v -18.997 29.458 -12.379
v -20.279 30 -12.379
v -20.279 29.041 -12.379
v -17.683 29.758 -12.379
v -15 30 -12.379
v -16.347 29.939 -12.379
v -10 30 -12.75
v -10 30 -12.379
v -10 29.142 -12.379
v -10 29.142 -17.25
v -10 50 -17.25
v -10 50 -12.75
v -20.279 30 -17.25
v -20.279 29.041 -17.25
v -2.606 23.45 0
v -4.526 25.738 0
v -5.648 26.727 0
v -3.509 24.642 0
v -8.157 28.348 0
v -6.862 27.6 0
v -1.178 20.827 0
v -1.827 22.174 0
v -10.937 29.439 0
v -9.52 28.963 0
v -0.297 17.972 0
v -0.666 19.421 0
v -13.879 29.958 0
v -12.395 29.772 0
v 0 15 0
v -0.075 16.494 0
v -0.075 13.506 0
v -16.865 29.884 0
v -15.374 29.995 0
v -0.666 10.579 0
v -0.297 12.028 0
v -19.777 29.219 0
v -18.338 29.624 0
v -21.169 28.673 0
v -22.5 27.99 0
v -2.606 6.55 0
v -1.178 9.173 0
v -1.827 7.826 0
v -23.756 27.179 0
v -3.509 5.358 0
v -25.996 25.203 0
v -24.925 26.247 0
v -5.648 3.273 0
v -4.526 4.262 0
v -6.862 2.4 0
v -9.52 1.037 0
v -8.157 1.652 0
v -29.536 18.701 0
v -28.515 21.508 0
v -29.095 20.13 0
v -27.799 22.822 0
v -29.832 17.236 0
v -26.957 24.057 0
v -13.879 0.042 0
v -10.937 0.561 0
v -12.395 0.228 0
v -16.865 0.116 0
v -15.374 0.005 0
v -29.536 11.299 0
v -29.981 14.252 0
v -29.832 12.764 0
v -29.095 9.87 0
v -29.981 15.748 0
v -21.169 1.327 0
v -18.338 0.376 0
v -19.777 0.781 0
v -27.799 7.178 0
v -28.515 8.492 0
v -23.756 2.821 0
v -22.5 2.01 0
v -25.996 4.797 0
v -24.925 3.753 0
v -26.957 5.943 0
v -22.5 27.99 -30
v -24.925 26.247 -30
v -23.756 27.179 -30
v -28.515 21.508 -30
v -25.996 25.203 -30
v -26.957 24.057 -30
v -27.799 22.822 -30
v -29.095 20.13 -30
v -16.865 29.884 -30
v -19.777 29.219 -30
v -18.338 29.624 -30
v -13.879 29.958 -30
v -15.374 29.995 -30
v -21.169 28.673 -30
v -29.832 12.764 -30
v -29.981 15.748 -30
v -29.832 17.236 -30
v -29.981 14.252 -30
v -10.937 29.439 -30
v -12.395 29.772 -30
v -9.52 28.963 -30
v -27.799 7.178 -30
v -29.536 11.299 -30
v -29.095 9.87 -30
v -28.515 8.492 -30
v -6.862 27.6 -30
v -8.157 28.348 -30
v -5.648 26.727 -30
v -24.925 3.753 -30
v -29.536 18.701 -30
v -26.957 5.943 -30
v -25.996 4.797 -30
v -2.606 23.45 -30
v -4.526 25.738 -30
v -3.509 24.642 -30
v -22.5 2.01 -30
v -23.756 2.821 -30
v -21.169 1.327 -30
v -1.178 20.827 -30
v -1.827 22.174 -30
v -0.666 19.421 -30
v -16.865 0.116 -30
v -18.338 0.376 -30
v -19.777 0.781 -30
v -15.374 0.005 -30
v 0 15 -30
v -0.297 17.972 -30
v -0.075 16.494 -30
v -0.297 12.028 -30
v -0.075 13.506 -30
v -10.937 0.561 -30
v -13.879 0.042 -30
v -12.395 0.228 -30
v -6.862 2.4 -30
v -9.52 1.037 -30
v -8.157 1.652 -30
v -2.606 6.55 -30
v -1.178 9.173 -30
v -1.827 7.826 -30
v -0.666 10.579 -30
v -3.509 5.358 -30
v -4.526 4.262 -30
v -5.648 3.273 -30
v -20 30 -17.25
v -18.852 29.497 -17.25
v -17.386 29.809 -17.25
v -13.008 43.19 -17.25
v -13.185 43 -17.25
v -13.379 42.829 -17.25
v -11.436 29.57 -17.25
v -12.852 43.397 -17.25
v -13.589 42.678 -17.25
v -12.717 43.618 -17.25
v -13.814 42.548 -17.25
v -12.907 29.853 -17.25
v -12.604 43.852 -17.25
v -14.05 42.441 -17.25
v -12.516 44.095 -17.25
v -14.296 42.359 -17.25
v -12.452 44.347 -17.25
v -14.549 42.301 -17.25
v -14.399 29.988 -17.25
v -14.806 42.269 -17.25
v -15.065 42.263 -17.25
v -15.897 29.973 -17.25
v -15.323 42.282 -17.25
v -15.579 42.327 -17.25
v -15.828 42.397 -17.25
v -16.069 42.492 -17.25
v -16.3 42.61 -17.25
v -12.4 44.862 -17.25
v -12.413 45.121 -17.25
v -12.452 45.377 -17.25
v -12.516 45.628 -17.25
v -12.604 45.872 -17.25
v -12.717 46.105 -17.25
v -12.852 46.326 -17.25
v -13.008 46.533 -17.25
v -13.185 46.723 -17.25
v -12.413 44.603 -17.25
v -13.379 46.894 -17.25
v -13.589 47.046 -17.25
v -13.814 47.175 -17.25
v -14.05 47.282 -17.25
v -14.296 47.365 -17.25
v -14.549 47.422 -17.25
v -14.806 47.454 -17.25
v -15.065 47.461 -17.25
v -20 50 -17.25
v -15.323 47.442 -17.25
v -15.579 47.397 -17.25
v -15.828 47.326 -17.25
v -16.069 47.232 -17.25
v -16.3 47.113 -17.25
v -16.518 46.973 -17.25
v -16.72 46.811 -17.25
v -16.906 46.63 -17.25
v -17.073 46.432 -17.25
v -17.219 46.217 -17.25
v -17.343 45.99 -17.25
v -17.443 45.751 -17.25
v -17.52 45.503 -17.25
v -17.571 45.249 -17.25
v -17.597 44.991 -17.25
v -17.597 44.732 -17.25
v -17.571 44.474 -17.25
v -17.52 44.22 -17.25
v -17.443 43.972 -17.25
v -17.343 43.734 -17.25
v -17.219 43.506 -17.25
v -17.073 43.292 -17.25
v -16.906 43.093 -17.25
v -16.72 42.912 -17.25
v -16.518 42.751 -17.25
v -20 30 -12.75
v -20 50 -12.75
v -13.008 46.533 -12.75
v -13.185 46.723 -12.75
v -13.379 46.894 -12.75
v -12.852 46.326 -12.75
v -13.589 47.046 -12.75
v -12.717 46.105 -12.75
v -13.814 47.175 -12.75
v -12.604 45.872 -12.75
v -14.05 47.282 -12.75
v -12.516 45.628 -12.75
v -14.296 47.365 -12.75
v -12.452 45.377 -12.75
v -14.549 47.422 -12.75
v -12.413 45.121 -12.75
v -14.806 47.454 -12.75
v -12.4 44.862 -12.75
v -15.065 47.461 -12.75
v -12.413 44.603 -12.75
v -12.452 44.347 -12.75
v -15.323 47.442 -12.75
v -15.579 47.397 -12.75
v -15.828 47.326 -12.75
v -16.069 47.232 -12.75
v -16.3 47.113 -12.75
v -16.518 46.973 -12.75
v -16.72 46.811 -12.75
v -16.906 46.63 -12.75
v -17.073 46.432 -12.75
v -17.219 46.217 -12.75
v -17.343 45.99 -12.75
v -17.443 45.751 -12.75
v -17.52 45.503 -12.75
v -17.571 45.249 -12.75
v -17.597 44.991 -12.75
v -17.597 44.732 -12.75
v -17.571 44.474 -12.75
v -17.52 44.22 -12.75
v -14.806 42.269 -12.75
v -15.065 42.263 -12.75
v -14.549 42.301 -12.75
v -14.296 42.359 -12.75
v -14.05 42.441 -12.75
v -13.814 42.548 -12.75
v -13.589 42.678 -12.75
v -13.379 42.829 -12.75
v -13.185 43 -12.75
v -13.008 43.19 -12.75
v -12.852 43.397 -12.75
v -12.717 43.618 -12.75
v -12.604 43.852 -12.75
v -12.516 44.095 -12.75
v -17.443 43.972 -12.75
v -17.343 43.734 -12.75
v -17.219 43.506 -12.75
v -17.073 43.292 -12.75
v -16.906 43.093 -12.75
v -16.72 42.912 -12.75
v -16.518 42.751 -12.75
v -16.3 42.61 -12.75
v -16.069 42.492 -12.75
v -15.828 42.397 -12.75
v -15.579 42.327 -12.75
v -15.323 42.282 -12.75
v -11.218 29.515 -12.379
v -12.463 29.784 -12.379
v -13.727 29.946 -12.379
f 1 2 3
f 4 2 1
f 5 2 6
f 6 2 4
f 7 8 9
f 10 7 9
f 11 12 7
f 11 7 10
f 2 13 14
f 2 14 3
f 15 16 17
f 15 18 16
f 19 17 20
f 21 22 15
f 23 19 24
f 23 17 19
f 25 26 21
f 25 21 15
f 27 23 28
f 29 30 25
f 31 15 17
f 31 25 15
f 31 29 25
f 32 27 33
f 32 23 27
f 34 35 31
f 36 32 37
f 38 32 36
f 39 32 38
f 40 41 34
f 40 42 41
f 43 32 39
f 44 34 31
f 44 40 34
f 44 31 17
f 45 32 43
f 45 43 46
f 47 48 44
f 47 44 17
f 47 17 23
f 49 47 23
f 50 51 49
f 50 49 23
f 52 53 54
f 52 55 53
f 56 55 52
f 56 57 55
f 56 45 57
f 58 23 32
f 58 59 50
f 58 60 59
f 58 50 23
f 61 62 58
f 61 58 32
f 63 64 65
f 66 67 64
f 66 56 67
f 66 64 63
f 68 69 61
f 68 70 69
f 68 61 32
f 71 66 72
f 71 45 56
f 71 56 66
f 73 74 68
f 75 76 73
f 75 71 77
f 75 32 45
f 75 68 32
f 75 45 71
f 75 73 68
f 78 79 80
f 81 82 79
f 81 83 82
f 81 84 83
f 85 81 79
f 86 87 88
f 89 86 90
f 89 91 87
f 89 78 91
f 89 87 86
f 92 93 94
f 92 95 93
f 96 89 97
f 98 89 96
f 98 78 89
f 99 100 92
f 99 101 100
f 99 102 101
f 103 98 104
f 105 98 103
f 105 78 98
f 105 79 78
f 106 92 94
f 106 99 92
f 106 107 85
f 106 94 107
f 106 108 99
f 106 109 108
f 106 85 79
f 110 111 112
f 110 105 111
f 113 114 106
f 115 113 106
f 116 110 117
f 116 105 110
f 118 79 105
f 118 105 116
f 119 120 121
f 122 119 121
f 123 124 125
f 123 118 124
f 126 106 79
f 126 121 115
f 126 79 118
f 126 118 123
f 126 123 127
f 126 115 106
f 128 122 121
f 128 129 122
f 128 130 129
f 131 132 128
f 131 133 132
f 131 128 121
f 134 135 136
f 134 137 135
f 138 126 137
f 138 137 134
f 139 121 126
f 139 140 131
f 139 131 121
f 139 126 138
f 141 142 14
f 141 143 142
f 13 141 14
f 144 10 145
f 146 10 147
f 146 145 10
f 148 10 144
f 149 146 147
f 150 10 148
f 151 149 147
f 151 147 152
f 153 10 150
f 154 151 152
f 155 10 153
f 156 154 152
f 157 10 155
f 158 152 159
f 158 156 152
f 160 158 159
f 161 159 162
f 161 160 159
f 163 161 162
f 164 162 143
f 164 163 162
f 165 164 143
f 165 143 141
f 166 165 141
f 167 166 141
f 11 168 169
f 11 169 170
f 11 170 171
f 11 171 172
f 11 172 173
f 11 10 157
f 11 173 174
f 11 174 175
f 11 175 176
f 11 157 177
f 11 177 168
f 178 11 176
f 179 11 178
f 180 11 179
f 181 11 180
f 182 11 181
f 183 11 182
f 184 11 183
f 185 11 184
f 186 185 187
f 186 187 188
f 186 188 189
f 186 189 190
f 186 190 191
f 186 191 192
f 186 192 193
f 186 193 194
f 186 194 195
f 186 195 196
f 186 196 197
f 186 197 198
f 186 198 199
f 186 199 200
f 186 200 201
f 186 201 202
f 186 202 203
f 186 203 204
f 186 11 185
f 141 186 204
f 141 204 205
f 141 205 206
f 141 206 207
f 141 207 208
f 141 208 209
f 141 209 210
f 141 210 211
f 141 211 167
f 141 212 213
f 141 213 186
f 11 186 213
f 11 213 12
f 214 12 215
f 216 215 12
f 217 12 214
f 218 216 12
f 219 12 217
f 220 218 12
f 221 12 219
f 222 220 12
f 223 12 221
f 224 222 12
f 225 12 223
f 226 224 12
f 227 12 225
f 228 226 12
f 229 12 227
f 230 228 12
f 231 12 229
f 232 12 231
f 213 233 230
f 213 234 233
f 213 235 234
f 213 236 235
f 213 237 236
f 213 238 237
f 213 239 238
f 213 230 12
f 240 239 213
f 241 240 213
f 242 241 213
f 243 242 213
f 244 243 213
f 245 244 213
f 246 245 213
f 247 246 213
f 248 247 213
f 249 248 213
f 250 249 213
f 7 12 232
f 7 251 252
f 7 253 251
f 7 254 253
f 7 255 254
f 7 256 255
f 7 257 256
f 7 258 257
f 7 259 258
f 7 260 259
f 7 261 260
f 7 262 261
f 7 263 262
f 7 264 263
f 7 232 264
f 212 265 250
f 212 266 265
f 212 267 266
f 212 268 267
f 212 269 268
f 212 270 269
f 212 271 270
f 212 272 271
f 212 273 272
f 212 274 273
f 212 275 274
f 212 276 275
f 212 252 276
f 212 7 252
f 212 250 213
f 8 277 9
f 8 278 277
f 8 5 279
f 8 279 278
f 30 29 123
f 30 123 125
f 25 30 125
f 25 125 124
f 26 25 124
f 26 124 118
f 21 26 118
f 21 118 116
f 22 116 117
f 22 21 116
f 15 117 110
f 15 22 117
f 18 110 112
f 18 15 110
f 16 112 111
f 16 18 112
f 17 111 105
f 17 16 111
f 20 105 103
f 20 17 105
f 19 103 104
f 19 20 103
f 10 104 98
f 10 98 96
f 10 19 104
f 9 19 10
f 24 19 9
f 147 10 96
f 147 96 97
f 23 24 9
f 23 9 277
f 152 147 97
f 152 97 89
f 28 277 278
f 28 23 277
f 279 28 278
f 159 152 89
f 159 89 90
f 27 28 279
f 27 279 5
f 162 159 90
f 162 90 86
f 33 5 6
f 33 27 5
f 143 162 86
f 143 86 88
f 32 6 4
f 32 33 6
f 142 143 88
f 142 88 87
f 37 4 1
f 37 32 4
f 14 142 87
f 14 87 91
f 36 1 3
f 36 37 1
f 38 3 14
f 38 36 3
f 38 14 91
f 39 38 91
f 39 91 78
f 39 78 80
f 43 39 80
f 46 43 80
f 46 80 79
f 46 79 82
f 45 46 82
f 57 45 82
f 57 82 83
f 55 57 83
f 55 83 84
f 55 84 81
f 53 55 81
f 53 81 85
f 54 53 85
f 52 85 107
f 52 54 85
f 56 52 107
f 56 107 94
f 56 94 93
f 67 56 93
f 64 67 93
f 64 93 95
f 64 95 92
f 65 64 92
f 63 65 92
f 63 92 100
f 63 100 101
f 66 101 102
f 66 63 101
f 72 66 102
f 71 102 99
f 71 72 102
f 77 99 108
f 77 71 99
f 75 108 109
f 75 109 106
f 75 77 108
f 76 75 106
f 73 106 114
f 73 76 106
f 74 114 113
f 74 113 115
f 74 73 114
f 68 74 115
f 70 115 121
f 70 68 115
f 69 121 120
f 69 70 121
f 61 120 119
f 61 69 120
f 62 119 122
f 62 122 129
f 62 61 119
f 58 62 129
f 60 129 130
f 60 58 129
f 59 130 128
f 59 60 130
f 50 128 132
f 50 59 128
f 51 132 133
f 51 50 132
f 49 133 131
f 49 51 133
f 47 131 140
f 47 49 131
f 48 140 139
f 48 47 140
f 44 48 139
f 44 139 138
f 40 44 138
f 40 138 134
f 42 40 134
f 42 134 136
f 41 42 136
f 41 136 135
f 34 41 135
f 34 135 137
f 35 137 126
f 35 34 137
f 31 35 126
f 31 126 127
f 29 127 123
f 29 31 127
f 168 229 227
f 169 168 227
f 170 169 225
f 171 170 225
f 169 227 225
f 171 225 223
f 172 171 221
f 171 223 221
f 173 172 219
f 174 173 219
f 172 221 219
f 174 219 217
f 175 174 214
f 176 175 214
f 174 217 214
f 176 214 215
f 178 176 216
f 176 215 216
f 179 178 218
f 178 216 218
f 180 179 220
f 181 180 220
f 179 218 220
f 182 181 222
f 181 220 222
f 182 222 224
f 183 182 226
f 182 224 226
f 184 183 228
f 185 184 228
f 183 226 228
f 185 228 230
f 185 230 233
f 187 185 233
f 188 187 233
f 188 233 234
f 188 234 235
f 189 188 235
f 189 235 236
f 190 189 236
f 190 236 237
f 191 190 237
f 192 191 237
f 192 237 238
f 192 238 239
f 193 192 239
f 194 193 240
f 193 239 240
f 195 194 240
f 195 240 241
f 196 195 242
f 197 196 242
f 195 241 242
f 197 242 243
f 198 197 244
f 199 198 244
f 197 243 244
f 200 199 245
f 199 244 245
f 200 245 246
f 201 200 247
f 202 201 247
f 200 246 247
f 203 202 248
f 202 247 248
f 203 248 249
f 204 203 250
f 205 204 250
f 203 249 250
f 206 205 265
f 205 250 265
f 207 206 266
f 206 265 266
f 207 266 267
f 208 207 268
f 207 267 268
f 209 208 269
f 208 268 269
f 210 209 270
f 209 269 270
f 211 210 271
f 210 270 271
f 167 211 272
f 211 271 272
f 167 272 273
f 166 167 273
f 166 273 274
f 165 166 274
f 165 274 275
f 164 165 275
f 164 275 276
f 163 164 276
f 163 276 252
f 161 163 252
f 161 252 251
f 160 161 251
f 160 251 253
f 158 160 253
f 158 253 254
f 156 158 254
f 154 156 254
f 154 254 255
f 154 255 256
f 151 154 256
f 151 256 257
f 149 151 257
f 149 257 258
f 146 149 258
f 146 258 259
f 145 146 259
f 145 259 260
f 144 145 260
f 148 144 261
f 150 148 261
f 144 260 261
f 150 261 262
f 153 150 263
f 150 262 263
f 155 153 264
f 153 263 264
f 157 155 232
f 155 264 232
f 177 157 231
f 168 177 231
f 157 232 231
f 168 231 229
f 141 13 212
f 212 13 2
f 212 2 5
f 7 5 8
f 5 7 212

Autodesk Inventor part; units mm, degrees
ref_plane "YZ Plane" through (0, 0, 0) normal (1, 0, 0) x (0, 1, 0)
ref_plane "XZ Plane" through (0, 0, 0) normal (0, 1, 0) x (-1, 0, 0)
ref_plane "XY Plane" through (0, 0, 0) normal (0, 0, 1) x (1, 0, 0)
sketch "Sketch1" plane through (0, 0, 0) normal (0, 1, 0) x (-1, 0, 0)
  line L0 (0, 0) -> (30, 0)
  line L1 (30, 0) -> (30, -30)
  line L2 (30, -30) -> (0, -30)
  line L3 (0, -30) -> (0, 0)
  dimension "d0" = 30
  dimension "d1" = 30
extrude "Extrusion1" add sketch "Sketch1" along normal blind 30
sketch "Sketch2" plane through (0, 30, 0) normal (0, 1, 0) x (1, 0, 0)
  line L0 (-20, 17.25) -> (-10, 17.25)
  line L1 (-10, 17.25) -> (-10, 12.75)
  line L2 (-10, 12.75) -> (-20, 12.75)
  line L3 (-20, 12.75) -> (-20, 17.25)
  line L4 (-20, 17.25) -> (-10, 12.75) construction
  line L5 (-10, 17.25) -> (-20, 12.75) construction
  line L6 (-30, 30) -> (-30, 0) projected
  line L7 (-30, 0) -> (0, 0) projected
  point P0 (-15, 15)
  point P1 (-30, 15)
  dimension "d4" = 15
  dimension "d5" = 15
  dimension "d6" = 10
  dimension "d7" = 4.5
extrude "Extrusion2" add sketch "Sketch2" along normal blind 20
sketch "Sketch3" plane through (-20, 30, -12.75) normal (0, 0, 1) x (1, 0, 0)
  circle A0 centre (5, 14.8617) radius 2.6
  point P0 (20, -30)
  dimension "d10" = 5.2
extrude "Extrusion3" cut sketch "Sketch3" against normal blind 20
sketch "Sketch4" plane through (-30, 0, 0) normal (0, 0, 1) x (1, 0, 0)
  circle A0 centre (15, 15) radius 15
  line L0 (0, 30) -> (30, 30) projected
  line L1 (0, 0) -> (30, 0)
  line L2 (30, 0) -> (30, 30)
  line L3 (30, 30) -> (0, 30)
  line L4 (0, 30) -> (0, 0)
  line L5 (0, 0) -> (30, 30) construction
  line L6 (30, 0) -> (0, 30) construction
  point P0 (0, 15)
  point P1 (15, 30)
  point P2 (30, 15)
  point P3 (15, 0)
  dimension "d13" = 15
  dimension "d14" = 30
extrude "Extrusion4" cut sketch "Sketch4" against normal blind 71.25 contours L2 L1 A0 | A0 L0 L2 | A0 L4 L0 | L1 L4 A0
sketch "Sketch5" plane through (-15, 30, -17.25) normal (0, -1, 0) x (1, 0, 0)
  line L0 (-5.2786, 4.8714) -> (5, 4.8714)
  line L1 (5, 4.8714) -> (5, 0)
  line L2 (5, 0) -> (-5.2786, 0)
  line L3 (-5.2786, 0) -> (-5.2786, 4.8714)
  point P0 (15, 17.25)
extrude "Extrusion5" add sketch "Sketch5" along normal blind 5
properties part number "ObjectCylinder"
